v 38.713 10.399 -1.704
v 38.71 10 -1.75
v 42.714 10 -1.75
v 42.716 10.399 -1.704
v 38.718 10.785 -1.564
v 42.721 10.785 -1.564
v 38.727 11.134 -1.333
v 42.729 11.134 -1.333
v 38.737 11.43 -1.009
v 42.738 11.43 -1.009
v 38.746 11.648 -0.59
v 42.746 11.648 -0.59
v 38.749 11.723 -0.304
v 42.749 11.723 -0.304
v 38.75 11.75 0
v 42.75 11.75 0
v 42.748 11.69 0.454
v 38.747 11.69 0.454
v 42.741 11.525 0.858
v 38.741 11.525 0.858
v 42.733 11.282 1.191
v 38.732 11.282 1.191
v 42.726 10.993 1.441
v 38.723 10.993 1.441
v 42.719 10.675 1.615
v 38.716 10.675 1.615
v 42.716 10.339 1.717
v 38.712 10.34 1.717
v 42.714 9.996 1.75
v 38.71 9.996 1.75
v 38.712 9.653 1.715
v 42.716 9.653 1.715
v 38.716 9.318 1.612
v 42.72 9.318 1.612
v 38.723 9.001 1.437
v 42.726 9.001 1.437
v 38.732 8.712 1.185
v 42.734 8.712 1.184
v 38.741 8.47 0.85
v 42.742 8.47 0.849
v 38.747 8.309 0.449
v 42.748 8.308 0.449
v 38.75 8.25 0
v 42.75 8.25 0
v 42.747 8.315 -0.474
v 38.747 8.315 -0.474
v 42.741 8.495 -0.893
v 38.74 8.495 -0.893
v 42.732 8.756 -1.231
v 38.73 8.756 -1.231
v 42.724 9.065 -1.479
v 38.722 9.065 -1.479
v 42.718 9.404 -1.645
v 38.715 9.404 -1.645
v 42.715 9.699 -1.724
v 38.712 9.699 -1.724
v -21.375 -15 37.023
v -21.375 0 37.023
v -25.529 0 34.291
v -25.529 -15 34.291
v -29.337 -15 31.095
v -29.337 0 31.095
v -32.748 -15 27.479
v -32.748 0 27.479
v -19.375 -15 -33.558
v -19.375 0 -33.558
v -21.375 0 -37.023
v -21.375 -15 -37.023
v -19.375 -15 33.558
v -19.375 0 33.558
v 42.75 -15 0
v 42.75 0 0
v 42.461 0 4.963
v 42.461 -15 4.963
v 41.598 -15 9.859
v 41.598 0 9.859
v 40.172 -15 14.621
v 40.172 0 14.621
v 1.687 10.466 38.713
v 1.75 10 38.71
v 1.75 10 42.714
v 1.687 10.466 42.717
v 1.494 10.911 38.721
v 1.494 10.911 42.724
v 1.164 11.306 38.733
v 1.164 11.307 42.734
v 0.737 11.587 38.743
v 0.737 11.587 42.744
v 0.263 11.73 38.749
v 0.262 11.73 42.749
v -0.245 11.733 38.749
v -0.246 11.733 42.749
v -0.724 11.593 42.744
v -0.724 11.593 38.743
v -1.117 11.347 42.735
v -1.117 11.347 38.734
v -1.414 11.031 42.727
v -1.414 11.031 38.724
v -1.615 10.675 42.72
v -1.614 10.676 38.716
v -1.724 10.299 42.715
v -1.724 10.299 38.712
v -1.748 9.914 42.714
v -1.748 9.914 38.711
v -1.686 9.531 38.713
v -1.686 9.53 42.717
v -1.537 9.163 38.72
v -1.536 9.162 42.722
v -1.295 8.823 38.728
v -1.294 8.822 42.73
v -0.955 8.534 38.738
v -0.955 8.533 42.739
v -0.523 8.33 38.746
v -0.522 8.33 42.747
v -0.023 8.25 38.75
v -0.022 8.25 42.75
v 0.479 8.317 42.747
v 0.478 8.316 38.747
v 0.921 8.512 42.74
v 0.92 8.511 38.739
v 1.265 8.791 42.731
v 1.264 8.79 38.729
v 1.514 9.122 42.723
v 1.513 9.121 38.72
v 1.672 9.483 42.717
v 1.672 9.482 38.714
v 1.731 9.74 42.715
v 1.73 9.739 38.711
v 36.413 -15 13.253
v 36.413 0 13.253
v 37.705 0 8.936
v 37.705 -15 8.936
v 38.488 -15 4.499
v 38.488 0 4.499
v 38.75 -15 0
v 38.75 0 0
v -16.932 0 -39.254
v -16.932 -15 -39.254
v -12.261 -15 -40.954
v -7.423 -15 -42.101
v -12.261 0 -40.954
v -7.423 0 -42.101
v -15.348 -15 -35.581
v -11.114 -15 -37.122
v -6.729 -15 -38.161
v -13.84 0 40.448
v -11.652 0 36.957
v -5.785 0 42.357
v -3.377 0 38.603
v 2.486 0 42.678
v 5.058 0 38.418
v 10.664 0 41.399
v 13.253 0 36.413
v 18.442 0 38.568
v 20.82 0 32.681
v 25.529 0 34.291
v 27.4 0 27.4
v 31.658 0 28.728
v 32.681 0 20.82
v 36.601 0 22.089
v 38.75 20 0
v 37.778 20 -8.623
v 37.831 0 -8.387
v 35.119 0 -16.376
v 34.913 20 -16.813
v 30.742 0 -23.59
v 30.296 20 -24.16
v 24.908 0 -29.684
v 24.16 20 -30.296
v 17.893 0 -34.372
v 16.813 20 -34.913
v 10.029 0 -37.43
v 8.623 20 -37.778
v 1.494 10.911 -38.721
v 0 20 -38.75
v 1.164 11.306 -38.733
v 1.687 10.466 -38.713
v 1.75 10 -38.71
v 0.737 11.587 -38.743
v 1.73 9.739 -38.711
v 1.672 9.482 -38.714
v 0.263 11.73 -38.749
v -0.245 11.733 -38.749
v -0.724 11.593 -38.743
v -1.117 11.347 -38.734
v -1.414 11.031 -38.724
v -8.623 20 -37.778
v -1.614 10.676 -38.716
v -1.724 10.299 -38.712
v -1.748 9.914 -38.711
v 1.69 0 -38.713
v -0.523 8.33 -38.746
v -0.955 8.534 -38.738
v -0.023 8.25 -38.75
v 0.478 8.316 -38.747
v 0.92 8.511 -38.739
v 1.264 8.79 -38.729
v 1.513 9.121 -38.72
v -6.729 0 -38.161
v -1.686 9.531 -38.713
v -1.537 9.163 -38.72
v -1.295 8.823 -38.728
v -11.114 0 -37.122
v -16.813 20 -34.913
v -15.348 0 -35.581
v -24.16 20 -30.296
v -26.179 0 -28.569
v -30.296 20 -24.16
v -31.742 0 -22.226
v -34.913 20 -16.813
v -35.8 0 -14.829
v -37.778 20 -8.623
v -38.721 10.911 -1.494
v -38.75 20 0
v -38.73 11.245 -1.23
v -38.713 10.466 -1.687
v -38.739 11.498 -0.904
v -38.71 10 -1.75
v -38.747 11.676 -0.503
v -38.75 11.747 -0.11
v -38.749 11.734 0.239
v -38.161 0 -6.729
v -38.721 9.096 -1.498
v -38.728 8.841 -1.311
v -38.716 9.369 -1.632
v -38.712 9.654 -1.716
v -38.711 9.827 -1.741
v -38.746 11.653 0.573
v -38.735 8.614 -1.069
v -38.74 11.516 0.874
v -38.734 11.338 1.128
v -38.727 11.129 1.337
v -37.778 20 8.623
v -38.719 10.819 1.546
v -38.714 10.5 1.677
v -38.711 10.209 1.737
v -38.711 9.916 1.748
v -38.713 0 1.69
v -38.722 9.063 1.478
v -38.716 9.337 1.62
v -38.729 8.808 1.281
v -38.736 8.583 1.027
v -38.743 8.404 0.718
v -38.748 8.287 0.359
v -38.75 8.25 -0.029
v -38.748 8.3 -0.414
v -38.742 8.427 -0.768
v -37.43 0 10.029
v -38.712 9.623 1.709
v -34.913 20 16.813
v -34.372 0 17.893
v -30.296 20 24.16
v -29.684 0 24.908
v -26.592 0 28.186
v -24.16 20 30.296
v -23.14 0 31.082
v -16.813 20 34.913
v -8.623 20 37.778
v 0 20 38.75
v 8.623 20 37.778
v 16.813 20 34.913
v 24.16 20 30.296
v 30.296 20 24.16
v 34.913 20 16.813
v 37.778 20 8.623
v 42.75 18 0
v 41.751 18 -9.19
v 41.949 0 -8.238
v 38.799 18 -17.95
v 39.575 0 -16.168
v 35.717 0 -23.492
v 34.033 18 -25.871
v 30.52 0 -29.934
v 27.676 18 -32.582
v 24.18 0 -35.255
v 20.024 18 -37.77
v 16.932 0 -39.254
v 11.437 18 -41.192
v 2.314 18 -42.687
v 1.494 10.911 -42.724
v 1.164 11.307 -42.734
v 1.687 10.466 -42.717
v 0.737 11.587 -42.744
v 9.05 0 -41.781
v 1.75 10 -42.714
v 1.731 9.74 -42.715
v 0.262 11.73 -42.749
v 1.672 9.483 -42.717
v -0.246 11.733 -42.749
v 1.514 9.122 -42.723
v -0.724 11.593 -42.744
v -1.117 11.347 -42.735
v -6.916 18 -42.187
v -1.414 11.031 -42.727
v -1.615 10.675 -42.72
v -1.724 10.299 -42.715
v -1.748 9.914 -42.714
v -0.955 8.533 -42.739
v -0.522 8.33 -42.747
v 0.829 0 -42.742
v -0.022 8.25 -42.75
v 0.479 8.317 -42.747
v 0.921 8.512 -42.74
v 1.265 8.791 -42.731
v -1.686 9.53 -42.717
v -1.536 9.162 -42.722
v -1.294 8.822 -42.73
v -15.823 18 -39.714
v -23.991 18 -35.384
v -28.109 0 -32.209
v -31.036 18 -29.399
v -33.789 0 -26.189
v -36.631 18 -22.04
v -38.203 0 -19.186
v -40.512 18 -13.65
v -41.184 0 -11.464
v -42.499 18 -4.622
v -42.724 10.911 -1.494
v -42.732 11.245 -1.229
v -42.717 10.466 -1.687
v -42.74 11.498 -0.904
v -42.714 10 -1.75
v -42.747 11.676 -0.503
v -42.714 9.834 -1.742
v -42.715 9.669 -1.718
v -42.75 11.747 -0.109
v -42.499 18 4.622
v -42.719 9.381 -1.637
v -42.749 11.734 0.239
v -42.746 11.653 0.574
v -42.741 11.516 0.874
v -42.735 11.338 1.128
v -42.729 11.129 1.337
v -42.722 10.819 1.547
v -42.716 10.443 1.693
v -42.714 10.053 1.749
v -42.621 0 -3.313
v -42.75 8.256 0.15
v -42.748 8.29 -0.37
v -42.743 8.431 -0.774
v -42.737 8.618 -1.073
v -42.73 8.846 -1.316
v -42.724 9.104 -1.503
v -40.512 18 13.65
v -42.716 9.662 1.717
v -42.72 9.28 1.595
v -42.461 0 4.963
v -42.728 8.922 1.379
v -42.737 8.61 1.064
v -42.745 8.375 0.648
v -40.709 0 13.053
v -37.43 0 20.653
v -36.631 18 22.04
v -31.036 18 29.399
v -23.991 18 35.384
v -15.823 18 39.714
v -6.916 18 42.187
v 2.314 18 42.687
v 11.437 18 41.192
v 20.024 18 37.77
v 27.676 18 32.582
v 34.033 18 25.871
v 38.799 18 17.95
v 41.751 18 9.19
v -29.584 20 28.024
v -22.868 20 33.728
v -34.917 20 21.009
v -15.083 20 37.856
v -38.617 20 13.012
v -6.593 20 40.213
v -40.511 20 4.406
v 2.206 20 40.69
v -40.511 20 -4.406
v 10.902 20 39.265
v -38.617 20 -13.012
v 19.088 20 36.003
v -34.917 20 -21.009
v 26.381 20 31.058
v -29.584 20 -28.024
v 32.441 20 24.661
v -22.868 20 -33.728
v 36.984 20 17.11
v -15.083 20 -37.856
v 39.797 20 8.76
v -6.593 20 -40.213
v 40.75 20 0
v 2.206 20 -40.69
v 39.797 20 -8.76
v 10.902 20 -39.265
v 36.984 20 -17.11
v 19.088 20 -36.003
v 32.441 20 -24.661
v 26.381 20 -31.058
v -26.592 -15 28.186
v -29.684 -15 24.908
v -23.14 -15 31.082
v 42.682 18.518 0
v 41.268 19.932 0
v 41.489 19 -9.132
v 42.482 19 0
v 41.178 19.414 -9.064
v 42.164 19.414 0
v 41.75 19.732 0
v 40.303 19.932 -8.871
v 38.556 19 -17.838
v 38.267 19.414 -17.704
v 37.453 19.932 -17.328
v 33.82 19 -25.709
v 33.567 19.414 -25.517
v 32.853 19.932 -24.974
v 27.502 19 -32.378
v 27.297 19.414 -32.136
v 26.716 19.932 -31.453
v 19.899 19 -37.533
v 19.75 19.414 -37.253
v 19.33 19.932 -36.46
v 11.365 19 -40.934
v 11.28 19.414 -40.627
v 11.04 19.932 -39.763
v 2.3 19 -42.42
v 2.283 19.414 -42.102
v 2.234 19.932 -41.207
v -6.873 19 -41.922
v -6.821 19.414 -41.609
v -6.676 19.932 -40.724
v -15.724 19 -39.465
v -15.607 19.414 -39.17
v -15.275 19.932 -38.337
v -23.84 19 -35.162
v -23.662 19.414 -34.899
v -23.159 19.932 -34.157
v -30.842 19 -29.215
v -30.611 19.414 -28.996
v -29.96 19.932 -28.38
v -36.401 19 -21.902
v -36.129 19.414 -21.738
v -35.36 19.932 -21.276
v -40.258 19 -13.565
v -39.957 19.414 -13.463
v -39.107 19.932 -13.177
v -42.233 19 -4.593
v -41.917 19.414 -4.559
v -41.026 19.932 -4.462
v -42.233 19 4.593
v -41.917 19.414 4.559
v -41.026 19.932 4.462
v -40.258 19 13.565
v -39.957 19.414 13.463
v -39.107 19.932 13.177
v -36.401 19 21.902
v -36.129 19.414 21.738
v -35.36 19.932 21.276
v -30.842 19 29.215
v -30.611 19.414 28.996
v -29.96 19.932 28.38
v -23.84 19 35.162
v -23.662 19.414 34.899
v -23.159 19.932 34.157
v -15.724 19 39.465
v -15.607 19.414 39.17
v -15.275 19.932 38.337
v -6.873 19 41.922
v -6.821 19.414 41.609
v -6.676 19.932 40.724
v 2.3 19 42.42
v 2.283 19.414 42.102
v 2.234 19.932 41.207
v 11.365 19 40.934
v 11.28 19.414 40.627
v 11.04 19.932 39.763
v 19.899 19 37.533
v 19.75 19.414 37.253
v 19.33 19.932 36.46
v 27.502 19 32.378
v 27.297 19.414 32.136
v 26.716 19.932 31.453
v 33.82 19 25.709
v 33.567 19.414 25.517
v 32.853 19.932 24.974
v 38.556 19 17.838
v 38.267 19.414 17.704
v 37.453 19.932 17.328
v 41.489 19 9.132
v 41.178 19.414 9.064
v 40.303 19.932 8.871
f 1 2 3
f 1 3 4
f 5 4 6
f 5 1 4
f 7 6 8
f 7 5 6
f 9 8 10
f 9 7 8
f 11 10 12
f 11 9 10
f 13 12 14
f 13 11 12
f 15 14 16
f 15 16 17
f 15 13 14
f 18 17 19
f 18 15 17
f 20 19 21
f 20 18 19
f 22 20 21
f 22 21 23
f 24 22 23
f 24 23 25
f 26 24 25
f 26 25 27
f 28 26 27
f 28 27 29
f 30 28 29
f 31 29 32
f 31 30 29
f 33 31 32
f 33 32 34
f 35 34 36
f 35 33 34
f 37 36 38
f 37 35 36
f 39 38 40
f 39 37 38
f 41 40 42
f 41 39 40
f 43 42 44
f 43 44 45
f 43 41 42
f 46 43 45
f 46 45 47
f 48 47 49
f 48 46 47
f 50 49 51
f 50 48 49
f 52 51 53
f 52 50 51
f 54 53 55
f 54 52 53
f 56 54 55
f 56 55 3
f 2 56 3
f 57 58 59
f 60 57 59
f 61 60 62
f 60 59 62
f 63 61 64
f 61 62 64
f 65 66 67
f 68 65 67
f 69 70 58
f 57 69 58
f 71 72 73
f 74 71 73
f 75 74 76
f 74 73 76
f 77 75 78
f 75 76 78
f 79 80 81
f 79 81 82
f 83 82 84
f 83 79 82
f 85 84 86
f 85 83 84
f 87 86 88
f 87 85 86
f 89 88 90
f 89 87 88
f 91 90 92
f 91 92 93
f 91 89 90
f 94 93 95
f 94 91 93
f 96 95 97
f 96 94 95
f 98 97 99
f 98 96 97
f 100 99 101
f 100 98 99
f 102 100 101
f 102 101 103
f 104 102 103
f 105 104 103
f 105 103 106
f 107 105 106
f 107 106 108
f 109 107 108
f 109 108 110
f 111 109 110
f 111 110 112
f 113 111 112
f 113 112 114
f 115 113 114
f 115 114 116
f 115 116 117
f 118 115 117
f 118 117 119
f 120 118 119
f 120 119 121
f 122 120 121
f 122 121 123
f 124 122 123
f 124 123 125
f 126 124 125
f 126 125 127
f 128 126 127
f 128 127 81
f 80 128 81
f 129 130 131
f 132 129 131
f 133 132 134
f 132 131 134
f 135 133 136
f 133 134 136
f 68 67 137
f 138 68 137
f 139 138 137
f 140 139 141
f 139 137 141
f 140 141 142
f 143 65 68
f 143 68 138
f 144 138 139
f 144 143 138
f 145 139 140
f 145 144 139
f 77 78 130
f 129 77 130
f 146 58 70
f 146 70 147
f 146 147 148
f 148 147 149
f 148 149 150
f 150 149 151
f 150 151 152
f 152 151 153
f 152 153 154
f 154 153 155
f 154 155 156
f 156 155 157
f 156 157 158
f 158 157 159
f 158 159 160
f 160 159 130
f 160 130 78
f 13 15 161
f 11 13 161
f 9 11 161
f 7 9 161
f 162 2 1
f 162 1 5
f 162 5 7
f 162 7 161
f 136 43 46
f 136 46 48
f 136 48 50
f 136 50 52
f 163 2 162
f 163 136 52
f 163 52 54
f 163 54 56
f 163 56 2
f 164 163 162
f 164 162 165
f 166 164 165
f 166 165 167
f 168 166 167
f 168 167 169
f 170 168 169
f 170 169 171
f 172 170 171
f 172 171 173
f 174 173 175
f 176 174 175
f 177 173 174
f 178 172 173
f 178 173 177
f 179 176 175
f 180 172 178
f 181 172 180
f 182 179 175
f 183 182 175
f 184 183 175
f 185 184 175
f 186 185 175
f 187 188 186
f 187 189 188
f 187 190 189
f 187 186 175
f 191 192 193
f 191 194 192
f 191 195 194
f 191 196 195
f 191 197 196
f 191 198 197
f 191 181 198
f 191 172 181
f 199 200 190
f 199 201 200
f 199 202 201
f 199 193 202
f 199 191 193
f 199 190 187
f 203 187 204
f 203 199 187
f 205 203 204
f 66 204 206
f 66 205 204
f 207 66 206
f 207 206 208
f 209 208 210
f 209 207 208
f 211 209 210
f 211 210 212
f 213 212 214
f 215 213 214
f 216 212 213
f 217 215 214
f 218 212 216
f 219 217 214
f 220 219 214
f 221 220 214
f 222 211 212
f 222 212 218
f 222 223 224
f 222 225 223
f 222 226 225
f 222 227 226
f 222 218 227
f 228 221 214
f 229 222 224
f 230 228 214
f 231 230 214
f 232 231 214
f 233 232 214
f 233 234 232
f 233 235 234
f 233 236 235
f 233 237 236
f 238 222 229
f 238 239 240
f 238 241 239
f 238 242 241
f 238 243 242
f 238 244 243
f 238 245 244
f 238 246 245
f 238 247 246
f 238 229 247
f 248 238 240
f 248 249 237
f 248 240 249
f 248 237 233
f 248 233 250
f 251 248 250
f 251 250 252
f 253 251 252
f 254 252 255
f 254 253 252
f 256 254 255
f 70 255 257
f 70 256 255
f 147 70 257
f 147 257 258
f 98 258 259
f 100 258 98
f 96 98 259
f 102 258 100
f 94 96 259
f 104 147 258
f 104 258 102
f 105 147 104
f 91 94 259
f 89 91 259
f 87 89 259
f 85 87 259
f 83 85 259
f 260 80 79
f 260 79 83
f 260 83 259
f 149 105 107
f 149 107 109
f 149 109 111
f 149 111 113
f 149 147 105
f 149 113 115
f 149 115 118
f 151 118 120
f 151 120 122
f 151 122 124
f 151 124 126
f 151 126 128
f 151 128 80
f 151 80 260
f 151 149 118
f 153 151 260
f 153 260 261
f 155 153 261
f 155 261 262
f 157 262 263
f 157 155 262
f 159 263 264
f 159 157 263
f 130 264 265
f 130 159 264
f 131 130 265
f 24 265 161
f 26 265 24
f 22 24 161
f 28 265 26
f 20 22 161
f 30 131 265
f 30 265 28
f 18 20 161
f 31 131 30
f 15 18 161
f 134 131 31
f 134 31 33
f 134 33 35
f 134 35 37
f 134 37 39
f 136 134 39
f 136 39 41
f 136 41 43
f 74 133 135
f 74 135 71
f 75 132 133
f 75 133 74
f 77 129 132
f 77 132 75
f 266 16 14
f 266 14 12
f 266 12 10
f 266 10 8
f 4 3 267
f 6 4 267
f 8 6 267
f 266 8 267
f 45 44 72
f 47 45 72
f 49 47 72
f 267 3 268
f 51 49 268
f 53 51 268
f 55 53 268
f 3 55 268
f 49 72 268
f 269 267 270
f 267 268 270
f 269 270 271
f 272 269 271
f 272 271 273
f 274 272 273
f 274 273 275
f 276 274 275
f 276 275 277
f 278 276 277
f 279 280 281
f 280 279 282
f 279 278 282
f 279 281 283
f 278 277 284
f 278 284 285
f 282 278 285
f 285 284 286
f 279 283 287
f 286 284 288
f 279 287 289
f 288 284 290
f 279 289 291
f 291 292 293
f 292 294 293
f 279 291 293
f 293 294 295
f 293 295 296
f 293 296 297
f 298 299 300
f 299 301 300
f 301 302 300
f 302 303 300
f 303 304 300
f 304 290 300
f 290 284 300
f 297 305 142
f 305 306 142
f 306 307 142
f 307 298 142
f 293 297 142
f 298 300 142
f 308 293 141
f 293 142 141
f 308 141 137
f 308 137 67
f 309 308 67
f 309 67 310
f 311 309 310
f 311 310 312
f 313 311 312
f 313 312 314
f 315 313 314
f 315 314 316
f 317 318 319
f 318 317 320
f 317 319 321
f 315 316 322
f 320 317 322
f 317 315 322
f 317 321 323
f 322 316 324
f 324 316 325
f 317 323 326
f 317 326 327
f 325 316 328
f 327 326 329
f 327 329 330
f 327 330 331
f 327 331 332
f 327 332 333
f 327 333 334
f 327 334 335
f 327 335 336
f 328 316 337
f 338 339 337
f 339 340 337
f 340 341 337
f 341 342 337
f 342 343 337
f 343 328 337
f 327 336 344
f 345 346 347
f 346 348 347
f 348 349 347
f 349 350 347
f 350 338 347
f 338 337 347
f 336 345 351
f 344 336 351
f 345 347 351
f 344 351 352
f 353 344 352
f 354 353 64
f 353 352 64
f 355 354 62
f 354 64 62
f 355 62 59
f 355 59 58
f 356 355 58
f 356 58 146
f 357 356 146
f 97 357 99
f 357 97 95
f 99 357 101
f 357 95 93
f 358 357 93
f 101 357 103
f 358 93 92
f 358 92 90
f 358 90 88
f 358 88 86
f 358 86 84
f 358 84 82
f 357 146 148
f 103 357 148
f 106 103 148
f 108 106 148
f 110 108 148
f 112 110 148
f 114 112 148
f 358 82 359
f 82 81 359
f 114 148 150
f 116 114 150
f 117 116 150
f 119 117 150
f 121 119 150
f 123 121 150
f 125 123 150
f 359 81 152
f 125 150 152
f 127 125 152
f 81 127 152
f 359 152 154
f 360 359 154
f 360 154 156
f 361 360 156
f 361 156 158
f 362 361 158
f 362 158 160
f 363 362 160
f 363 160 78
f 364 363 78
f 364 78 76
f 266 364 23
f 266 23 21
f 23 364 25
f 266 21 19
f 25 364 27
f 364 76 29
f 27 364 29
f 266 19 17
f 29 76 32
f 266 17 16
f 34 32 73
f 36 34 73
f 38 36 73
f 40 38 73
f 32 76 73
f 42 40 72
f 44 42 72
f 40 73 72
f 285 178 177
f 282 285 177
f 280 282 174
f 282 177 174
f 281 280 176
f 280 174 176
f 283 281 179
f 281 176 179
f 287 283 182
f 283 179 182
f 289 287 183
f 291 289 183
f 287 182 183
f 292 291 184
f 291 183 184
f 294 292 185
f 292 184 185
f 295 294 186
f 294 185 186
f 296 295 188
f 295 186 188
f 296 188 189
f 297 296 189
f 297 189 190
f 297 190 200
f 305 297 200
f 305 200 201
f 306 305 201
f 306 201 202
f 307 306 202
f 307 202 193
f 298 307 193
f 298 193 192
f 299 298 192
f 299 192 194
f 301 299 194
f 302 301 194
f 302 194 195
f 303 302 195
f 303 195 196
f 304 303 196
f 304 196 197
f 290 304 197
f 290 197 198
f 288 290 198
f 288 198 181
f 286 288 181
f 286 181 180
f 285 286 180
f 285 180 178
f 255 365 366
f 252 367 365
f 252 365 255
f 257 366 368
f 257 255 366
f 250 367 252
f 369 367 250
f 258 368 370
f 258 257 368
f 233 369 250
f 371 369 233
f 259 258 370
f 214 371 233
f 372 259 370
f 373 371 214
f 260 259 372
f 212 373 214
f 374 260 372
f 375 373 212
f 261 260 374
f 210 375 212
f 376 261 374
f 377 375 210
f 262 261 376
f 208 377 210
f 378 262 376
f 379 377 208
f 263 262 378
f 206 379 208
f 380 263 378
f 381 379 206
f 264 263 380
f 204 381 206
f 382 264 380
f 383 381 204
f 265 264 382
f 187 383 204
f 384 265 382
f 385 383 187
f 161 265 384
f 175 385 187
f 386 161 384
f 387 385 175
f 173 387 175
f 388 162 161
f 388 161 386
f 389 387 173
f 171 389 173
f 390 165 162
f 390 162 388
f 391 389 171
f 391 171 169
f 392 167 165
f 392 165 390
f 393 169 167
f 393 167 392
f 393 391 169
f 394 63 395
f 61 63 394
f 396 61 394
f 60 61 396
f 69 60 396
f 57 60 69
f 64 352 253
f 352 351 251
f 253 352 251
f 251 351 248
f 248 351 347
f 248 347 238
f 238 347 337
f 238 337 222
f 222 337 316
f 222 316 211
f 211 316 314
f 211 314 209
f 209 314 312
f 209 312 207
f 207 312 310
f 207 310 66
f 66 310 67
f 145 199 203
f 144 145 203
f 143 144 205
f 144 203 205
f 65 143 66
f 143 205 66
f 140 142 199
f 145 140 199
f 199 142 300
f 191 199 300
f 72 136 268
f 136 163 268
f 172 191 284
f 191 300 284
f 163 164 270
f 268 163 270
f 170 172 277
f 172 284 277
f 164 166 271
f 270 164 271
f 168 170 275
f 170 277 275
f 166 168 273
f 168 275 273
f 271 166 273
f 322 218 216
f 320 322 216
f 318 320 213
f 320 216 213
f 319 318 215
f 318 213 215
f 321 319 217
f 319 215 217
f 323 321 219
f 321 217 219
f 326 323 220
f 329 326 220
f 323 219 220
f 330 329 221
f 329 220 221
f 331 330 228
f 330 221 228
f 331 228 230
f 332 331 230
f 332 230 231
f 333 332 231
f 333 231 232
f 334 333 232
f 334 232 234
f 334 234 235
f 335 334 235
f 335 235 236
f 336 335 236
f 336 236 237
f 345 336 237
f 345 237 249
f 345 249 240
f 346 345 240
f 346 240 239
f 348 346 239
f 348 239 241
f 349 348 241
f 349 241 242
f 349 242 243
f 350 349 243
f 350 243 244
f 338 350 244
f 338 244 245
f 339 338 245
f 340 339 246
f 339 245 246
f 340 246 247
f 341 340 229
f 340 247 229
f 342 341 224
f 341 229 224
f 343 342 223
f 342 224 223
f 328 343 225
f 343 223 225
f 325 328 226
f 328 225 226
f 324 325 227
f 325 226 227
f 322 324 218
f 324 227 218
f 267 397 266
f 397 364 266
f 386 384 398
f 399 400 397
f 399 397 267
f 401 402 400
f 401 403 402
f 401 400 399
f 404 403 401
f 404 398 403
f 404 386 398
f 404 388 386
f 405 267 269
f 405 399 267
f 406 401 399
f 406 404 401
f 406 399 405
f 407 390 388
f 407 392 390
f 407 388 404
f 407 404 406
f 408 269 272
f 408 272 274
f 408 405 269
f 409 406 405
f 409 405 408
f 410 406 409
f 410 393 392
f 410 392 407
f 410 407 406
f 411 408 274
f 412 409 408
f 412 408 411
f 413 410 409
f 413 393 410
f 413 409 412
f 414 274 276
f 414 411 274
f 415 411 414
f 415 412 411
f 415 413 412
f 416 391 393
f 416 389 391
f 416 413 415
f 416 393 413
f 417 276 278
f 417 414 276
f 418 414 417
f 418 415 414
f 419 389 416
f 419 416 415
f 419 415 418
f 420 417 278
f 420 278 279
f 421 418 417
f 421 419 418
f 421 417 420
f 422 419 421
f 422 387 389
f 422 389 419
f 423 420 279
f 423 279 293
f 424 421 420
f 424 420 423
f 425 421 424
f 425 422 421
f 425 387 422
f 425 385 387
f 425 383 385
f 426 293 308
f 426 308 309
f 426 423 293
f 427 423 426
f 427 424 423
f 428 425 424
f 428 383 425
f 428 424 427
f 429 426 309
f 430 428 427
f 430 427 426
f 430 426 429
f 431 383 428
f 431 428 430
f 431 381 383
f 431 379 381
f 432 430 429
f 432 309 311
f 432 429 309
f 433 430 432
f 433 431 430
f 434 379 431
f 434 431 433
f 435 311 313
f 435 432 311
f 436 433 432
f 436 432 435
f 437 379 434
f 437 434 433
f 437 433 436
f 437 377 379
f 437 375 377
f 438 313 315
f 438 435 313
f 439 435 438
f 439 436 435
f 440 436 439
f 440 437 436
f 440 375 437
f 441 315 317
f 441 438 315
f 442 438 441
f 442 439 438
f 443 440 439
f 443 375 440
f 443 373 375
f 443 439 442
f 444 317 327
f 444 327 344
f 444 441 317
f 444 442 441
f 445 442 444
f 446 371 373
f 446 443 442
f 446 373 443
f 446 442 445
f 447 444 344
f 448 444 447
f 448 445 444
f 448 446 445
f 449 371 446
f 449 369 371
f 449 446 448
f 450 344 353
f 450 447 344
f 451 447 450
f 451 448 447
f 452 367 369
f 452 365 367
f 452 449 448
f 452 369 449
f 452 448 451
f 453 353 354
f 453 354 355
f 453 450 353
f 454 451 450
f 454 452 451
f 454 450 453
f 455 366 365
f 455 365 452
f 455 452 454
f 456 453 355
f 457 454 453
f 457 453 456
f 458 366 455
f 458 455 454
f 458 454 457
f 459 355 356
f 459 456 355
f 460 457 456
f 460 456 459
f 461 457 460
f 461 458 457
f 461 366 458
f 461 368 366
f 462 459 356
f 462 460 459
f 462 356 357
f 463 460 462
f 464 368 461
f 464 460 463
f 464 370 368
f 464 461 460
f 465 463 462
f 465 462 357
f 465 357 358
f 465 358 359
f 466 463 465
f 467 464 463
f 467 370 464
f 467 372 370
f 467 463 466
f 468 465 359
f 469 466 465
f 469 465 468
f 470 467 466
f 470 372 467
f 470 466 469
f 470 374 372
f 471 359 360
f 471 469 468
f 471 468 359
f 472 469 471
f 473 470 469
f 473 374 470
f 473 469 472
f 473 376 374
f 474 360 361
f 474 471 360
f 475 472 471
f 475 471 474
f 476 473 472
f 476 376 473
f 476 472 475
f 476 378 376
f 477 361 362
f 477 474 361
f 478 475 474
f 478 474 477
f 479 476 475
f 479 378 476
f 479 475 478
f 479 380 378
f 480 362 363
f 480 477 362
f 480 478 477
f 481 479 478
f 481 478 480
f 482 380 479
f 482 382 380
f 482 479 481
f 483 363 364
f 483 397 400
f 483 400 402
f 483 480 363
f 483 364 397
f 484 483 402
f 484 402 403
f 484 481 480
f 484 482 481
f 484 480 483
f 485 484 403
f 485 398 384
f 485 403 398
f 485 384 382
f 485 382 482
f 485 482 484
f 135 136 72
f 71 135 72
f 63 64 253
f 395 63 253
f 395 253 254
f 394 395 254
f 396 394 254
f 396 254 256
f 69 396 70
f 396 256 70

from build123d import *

# Parameters (mm, degrees)
SKETCH1_R               = 42.75
SKETCH1_R_2             = 38.75
BOSS_EXTRUDE1_DEPTH     = 20
BOSS_EXTRUDE2_DEPTH     = 15
SKETCH3_R               = 1.75
CUT_EXTRUDE1_DEPTH      = 43.75
CUT_EXTRUDE1_DEPTH_BACK = 43.75
SKETCH4_R               = 1.75
CUT_EXTRUDE2_DEPTH      = 43.7500001
CUT_EXTRUDE2_DEPTH_BACK = 43.7500001
FILLET1_R               = 2


with BuildPart() as part:
    # Sketch1 → Boss-Extrude1 (new body)
    with BuildSketch(Plane(origin=(0, 0, 0), x_dir=(1, 0, 0), z_dir=(0, 1, 0))):
        Circle(SKETCH1_R)
        Circle(SKETCH1_R_2, mode=Mode.SUBTRACT)
    extrude(amount=BOSS_EXTRUDE1_DEPTH)

    # Sketch2 → Boss-Extrude2 (add)
    with BuildSketch(Plane.XZ):
        with BuildLine():
            Line((40.171859539, 14.621361127), (36.413089055, 13.253280554))
            ThreePointArc((36.413089055, 13.253280554), (38.161300429, 6.728866885), (38.75, 0))
            Line((38.75, 0), (42.75, 0))
            ThreePointArc((42.75, 0), (42.100531441, 7.423459595), (40.171859539, 14.621361127))
        make_face()
        with BuildLine():
            Line((-7.423459595, -42.100531441), (-6.728866885, -38.161300429))
            ThreePointArc((-6.728866885, -38.161300429), (-13.253280554, -36.413089056), (-19.375, -33.558484397))
            Line((-19.375, -33.558484397), (-21.375, -37.022586012))
            ThreePointArc((-21.375, -37.022586012), (-14.621361127, -40.171859539), (-7.423459595, -42.100531441))
        make_face()
        with BuildLine():
            Line((-32.748399943, 27.479170314), (-29.684222171, 24.908019875))
            ThreePointArc((-29.684222171, 24.908019875), (-24.908019875, 29.684222171), (-19.375, 33.558484397))
            Line((-19.375, 33.558484397), (-21.375, 37.022586012))
            ThreePointArc((-21.375, 37.022586012), (-27.479170314, 32.748399943), (-32.748399943, 27.479170314))
        make_face()
    extrude(amount=BOSS_EXTRUDE2_DEPTH)

    # Sketch3 → Cut-Extrude1 (cut, two sides)
    with BuildSketch(Plane.XY) as cut_extrude1_sk:
        with Locations((0, 10)):
            Circle(SKETCH3_R)
    extrude(amount=CUT_EXTRUDE1_DEPTH, mode=Mode.SUBTRACT)
    extrude(cut_extrude1_sk.sketch, amount=-CUT_EXTRUDE1_DEPTH_BACK, mode=Mode.SUBTRACT)

    # Sketch4 → Cut-Extrude2 (cut, two sides)
    with BuildSketch(Plane(origin=(0, 0, 0), x_dir=(0, 0, -1), z_dir=(1, 0, 0))) as cut_extrude2_sk:
        with Locations((0, 10)):
            Circle(SKETCH4_R)
    extrude(amount=CUT_EXTRUDE2_DEPTH, mode=Mode.SUBTRACT)
    extrude(cut_extrude2_sk.sketch, amount=-CUT_EXTRUDE2_DEPTH_BACK, mode=Mode.SUBTRACT)

    # Fillet1
    fillet1_edges = [part.edges().sort_by_distance(p)[0] for p in [
        (-42.75, 20, 0),
    ]]
    fillet(fillet1_edges, radius=FILLET1_R)


solid = part.part
